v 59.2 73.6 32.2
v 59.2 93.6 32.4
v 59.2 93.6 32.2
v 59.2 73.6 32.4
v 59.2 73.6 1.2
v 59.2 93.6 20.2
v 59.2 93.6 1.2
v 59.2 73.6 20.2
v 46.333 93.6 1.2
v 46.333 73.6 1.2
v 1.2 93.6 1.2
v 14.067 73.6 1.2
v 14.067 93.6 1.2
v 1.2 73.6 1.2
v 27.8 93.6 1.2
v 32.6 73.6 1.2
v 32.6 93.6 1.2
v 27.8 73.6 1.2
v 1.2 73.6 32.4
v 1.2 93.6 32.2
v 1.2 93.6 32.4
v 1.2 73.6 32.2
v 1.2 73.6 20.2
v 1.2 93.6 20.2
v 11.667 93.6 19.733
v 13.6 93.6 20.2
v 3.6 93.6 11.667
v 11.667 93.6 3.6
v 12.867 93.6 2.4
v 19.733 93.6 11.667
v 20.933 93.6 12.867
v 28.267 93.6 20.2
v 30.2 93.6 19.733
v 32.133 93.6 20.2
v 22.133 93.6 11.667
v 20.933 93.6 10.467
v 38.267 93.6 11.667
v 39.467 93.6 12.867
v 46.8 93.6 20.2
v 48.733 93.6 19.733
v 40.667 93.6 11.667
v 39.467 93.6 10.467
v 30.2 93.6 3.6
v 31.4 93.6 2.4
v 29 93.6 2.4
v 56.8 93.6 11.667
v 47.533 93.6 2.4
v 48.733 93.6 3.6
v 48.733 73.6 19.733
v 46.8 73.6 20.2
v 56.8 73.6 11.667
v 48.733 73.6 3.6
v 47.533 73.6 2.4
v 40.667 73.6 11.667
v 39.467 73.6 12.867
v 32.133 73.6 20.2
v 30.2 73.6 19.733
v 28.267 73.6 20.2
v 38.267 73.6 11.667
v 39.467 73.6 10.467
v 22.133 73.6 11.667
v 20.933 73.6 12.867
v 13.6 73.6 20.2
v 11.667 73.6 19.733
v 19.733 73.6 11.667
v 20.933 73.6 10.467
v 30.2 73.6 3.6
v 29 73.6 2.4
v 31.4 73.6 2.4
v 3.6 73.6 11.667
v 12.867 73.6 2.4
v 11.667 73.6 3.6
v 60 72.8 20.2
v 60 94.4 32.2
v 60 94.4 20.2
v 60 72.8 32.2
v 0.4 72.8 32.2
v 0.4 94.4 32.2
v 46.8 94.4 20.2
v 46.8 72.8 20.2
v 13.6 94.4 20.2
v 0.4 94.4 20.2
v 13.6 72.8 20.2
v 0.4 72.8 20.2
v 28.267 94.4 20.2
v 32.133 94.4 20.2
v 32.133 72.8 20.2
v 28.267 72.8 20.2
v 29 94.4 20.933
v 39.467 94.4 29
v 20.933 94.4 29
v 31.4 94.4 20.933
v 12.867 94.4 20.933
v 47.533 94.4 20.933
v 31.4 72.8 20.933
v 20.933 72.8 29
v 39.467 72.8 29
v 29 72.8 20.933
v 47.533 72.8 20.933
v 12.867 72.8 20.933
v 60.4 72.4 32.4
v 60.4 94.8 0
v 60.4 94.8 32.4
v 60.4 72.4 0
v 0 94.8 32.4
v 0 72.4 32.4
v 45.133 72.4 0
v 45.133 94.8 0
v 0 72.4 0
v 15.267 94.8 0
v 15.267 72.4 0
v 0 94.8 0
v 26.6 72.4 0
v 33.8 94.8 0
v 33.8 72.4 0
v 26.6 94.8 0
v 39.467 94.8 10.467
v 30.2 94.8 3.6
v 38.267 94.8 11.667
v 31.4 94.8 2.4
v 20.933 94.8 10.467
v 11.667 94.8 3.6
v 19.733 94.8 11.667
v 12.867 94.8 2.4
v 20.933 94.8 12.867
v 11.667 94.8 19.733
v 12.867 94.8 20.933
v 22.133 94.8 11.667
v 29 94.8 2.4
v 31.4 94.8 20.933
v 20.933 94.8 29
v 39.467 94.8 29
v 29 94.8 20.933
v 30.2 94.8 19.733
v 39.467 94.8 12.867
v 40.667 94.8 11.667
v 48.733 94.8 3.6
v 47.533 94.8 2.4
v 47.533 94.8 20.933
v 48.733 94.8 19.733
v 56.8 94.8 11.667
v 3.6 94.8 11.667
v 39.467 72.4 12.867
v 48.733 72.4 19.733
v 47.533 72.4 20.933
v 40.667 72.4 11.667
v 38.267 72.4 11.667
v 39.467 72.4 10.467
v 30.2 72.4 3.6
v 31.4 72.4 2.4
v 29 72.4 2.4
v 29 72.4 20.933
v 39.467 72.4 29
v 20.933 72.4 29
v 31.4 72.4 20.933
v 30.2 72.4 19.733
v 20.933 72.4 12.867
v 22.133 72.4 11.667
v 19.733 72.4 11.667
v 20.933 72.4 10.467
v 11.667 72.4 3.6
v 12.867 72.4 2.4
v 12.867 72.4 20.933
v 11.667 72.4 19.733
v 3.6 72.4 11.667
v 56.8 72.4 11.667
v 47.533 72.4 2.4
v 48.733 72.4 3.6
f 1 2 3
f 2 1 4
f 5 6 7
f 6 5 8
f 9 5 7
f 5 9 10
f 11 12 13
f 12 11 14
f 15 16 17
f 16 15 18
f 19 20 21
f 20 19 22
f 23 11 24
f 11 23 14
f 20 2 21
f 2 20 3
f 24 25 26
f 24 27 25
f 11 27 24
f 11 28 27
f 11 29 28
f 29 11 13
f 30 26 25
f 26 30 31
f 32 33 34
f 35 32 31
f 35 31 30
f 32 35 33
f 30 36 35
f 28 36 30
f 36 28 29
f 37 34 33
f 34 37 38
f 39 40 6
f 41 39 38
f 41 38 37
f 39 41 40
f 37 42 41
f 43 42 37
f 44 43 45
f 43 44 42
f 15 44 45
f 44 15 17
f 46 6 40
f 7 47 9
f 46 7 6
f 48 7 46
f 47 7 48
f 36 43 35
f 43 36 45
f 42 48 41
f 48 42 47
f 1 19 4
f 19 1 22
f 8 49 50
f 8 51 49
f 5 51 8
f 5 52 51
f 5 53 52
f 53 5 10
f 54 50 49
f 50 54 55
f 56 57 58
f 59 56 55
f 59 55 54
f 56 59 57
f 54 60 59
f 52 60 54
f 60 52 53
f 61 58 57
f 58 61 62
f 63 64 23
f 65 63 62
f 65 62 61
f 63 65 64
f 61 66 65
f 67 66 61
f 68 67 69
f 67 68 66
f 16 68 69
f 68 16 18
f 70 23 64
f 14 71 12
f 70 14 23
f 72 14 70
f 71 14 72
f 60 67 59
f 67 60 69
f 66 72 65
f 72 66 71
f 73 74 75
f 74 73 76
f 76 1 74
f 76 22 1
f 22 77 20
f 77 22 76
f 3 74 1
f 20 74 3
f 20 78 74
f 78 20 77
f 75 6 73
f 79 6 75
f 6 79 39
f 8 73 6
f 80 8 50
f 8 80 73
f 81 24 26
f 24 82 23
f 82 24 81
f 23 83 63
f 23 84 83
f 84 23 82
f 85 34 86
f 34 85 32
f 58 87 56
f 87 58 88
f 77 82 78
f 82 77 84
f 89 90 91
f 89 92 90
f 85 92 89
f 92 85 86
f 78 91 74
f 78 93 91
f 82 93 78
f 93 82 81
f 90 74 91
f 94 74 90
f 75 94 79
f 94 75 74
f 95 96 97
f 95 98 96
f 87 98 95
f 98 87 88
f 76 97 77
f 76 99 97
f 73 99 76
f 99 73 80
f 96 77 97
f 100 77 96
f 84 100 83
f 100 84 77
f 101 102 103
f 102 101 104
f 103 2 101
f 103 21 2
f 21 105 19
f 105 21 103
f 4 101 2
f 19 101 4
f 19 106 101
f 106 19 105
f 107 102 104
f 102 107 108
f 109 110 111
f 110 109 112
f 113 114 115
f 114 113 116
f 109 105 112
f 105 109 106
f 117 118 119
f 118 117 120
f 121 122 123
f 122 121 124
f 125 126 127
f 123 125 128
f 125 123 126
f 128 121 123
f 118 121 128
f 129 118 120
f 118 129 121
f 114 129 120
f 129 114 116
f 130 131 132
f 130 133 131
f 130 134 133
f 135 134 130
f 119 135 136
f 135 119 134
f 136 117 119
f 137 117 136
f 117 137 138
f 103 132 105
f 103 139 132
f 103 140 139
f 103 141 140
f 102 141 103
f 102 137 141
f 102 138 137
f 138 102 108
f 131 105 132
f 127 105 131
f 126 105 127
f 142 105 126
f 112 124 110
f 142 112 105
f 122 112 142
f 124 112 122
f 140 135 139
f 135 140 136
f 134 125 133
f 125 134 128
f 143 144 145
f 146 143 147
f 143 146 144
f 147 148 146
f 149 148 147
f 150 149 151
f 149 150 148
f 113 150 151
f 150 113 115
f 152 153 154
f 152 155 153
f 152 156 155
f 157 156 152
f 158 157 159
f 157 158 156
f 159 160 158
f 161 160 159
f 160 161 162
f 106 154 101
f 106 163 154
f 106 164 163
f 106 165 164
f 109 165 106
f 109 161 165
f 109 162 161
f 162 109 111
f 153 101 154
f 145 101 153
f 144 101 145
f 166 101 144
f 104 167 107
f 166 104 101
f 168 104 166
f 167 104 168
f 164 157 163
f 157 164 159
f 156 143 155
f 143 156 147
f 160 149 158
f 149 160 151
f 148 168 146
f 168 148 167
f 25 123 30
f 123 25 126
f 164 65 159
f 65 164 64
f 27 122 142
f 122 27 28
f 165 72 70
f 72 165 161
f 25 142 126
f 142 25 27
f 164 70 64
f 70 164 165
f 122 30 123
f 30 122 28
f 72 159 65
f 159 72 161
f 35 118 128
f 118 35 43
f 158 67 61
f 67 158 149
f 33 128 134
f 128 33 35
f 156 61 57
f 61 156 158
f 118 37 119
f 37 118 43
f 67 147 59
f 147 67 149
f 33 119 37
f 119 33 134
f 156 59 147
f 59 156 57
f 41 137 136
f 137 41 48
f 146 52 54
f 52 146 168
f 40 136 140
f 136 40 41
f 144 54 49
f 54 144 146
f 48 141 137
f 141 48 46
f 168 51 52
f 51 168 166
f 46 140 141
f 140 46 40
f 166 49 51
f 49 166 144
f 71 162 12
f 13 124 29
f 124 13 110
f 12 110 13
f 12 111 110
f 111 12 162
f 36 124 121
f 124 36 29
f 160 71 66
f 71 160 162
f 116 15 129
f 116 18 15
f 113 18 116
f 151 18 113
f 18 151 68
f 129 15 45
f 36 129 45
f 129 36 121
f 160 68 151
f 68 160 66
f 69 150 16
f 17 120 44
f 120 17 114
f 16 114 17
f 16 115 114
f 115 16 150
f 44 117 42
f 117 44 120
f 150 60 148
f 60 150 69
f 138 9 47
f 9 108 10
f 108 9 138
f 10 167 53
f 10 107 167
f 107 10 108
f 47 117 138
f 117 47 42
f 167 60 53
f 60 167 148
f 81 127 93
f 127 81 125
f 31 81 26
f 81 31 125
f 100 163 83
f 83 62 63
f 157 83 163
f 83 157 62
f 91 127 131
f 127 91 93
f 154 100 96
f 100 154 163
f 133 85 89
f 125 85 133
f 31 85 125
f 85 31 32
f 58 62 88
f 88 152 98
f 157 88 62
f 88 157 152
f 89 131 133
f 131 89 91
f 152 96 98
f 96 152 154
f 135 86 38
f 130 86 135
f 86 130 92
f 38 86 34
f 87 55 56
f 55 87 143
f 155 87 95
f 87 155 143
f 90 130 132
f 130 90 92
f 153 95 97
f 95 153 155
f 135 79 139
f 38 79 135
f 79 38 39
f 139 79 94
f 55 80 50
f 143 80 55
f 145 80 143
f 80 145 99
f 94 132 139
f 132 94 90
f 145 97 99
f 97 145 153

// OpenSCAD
$fn = 100;
/* dimensions */

card_w = 58; // 60
card_h = 90;
card_z = 20;
box_thickness = 1.2;
box_neck_thickness = 0.8;

/* proportions */
box_base_to_lid = 2 / 3;
box_neck_to_lid = 1 / 3;

box_base_interior_h = card_h * box_base_to_lid;
box_lid_interior_h = card_h * 1 / 3;
box_neck_h = box_lid_interior_h * box_neck_to_lid;

module box_base() {
  difference() {
    union() {
      cube([
        card_w + 2 * box_thickness, card_z + 2 * box_thickness,
        box_base_interior_h + 2 *
        box_thickness
      ]);
      translate([
        box_thickness - box_neck_thickness, box_thickness - box_neck_thickness,
        box_thickness +
        box_base_interior_h
      ])
          cube([
            card_w + 2 * box_neck_thickness, card_z + 2 * box_neck_thickness,
            box_neck_h + 2 *
            box_thickness
          ]);
    }
    translate([ box_thickness, box_thickness, box_thickness ])
        cube([ card_w, card_z, card_h ]);
  }
}

module box_lid() {
  difference() {
    union() {
      cube([
        card_w + 2 * box_thickness, card_z + 2 * box_thickness,
        box_lid_interior_h + 2 *
        box_thickness
      ]);
    }
    translate([ box_thickness, box_thickness, box_thickness ]) union() {
      cube([ card_w, card_z, card_h ]);
      translate([
        -box_neck_thickness, -box_neck_thickness,
        box_lid_interior_h - box_neck_h - 1
      ])
          cube([
            card_w + 2 * box_neck_thickness, card_z + 2 * box_neck_thickness,
            box_neck_h + 2
          ]);
    }
  }
}

module holes(w, h, wn = 3, hn = 3, t = 2.4, h = 100) {
  t_multiplier = 2 + wn - 1;
  d = (w - t * t_multiplier) / wn;

  translate([ d / 2, d / 2, 0 ]) for (h_count = [0:hn - 1]) {
    translate([ 0, t + h_count * (d + t), 0 ]) {
      for (w_count = [0:wn - 1]) {
        translate([ t + w_count * (d + t), 0, h / 2 ]) rotate([ 0, 0, 45 ])
            cube(
                [
                  (sqrt((d / 2) * (d / 2) * 2)), (sqrt((d / 2) * (d / 2) * 2)),
                  h
                ],
                center = true);
        // cylinder(d=d, h=h);
      }
    }
  }
  translate([ d + t / 2, d + t / 2, 0 ]) for (h_count = [0:hn - 2]) {
    translate([ 0, t + h_count * (d + t), 0 ]) {
      for (w_count = [0:wn - 2]) {
        translate([ t + w_count * (d + t), 0, h / 2 ]) rotate([ 0, 0, 45 ])
            cube(
                [
                  (sqrt((d / 2) * (d / 2) * 2)), (sqrt((d / 2) * (d / 2) * 2)),
                  h
                ],
                center = true);
        // cylinder(d=d-4*t, h=h);
      }
    }
  }
}

//////////////////////////
// Put it all together //
////////////////////////

choice = 0;

if (choice == 1) {
  difference() {
    box_base();
    translate([ box_thickness, 50, box_thickness ]) rotate([ 90, 0, 0 ])
        holes(card_w, card_h, wn = 4, hn = 4);
  }
} else {
  translate([ 0, card_z + box_thickness * 2 + 50, 0 ]) difference() {
    box_lid();
    translate([ box_thickness, 50, box_thickness ]) rotate([ 90, 0, 0 ])
        holes(card_w, card_h, hn = 1);
  }
}
